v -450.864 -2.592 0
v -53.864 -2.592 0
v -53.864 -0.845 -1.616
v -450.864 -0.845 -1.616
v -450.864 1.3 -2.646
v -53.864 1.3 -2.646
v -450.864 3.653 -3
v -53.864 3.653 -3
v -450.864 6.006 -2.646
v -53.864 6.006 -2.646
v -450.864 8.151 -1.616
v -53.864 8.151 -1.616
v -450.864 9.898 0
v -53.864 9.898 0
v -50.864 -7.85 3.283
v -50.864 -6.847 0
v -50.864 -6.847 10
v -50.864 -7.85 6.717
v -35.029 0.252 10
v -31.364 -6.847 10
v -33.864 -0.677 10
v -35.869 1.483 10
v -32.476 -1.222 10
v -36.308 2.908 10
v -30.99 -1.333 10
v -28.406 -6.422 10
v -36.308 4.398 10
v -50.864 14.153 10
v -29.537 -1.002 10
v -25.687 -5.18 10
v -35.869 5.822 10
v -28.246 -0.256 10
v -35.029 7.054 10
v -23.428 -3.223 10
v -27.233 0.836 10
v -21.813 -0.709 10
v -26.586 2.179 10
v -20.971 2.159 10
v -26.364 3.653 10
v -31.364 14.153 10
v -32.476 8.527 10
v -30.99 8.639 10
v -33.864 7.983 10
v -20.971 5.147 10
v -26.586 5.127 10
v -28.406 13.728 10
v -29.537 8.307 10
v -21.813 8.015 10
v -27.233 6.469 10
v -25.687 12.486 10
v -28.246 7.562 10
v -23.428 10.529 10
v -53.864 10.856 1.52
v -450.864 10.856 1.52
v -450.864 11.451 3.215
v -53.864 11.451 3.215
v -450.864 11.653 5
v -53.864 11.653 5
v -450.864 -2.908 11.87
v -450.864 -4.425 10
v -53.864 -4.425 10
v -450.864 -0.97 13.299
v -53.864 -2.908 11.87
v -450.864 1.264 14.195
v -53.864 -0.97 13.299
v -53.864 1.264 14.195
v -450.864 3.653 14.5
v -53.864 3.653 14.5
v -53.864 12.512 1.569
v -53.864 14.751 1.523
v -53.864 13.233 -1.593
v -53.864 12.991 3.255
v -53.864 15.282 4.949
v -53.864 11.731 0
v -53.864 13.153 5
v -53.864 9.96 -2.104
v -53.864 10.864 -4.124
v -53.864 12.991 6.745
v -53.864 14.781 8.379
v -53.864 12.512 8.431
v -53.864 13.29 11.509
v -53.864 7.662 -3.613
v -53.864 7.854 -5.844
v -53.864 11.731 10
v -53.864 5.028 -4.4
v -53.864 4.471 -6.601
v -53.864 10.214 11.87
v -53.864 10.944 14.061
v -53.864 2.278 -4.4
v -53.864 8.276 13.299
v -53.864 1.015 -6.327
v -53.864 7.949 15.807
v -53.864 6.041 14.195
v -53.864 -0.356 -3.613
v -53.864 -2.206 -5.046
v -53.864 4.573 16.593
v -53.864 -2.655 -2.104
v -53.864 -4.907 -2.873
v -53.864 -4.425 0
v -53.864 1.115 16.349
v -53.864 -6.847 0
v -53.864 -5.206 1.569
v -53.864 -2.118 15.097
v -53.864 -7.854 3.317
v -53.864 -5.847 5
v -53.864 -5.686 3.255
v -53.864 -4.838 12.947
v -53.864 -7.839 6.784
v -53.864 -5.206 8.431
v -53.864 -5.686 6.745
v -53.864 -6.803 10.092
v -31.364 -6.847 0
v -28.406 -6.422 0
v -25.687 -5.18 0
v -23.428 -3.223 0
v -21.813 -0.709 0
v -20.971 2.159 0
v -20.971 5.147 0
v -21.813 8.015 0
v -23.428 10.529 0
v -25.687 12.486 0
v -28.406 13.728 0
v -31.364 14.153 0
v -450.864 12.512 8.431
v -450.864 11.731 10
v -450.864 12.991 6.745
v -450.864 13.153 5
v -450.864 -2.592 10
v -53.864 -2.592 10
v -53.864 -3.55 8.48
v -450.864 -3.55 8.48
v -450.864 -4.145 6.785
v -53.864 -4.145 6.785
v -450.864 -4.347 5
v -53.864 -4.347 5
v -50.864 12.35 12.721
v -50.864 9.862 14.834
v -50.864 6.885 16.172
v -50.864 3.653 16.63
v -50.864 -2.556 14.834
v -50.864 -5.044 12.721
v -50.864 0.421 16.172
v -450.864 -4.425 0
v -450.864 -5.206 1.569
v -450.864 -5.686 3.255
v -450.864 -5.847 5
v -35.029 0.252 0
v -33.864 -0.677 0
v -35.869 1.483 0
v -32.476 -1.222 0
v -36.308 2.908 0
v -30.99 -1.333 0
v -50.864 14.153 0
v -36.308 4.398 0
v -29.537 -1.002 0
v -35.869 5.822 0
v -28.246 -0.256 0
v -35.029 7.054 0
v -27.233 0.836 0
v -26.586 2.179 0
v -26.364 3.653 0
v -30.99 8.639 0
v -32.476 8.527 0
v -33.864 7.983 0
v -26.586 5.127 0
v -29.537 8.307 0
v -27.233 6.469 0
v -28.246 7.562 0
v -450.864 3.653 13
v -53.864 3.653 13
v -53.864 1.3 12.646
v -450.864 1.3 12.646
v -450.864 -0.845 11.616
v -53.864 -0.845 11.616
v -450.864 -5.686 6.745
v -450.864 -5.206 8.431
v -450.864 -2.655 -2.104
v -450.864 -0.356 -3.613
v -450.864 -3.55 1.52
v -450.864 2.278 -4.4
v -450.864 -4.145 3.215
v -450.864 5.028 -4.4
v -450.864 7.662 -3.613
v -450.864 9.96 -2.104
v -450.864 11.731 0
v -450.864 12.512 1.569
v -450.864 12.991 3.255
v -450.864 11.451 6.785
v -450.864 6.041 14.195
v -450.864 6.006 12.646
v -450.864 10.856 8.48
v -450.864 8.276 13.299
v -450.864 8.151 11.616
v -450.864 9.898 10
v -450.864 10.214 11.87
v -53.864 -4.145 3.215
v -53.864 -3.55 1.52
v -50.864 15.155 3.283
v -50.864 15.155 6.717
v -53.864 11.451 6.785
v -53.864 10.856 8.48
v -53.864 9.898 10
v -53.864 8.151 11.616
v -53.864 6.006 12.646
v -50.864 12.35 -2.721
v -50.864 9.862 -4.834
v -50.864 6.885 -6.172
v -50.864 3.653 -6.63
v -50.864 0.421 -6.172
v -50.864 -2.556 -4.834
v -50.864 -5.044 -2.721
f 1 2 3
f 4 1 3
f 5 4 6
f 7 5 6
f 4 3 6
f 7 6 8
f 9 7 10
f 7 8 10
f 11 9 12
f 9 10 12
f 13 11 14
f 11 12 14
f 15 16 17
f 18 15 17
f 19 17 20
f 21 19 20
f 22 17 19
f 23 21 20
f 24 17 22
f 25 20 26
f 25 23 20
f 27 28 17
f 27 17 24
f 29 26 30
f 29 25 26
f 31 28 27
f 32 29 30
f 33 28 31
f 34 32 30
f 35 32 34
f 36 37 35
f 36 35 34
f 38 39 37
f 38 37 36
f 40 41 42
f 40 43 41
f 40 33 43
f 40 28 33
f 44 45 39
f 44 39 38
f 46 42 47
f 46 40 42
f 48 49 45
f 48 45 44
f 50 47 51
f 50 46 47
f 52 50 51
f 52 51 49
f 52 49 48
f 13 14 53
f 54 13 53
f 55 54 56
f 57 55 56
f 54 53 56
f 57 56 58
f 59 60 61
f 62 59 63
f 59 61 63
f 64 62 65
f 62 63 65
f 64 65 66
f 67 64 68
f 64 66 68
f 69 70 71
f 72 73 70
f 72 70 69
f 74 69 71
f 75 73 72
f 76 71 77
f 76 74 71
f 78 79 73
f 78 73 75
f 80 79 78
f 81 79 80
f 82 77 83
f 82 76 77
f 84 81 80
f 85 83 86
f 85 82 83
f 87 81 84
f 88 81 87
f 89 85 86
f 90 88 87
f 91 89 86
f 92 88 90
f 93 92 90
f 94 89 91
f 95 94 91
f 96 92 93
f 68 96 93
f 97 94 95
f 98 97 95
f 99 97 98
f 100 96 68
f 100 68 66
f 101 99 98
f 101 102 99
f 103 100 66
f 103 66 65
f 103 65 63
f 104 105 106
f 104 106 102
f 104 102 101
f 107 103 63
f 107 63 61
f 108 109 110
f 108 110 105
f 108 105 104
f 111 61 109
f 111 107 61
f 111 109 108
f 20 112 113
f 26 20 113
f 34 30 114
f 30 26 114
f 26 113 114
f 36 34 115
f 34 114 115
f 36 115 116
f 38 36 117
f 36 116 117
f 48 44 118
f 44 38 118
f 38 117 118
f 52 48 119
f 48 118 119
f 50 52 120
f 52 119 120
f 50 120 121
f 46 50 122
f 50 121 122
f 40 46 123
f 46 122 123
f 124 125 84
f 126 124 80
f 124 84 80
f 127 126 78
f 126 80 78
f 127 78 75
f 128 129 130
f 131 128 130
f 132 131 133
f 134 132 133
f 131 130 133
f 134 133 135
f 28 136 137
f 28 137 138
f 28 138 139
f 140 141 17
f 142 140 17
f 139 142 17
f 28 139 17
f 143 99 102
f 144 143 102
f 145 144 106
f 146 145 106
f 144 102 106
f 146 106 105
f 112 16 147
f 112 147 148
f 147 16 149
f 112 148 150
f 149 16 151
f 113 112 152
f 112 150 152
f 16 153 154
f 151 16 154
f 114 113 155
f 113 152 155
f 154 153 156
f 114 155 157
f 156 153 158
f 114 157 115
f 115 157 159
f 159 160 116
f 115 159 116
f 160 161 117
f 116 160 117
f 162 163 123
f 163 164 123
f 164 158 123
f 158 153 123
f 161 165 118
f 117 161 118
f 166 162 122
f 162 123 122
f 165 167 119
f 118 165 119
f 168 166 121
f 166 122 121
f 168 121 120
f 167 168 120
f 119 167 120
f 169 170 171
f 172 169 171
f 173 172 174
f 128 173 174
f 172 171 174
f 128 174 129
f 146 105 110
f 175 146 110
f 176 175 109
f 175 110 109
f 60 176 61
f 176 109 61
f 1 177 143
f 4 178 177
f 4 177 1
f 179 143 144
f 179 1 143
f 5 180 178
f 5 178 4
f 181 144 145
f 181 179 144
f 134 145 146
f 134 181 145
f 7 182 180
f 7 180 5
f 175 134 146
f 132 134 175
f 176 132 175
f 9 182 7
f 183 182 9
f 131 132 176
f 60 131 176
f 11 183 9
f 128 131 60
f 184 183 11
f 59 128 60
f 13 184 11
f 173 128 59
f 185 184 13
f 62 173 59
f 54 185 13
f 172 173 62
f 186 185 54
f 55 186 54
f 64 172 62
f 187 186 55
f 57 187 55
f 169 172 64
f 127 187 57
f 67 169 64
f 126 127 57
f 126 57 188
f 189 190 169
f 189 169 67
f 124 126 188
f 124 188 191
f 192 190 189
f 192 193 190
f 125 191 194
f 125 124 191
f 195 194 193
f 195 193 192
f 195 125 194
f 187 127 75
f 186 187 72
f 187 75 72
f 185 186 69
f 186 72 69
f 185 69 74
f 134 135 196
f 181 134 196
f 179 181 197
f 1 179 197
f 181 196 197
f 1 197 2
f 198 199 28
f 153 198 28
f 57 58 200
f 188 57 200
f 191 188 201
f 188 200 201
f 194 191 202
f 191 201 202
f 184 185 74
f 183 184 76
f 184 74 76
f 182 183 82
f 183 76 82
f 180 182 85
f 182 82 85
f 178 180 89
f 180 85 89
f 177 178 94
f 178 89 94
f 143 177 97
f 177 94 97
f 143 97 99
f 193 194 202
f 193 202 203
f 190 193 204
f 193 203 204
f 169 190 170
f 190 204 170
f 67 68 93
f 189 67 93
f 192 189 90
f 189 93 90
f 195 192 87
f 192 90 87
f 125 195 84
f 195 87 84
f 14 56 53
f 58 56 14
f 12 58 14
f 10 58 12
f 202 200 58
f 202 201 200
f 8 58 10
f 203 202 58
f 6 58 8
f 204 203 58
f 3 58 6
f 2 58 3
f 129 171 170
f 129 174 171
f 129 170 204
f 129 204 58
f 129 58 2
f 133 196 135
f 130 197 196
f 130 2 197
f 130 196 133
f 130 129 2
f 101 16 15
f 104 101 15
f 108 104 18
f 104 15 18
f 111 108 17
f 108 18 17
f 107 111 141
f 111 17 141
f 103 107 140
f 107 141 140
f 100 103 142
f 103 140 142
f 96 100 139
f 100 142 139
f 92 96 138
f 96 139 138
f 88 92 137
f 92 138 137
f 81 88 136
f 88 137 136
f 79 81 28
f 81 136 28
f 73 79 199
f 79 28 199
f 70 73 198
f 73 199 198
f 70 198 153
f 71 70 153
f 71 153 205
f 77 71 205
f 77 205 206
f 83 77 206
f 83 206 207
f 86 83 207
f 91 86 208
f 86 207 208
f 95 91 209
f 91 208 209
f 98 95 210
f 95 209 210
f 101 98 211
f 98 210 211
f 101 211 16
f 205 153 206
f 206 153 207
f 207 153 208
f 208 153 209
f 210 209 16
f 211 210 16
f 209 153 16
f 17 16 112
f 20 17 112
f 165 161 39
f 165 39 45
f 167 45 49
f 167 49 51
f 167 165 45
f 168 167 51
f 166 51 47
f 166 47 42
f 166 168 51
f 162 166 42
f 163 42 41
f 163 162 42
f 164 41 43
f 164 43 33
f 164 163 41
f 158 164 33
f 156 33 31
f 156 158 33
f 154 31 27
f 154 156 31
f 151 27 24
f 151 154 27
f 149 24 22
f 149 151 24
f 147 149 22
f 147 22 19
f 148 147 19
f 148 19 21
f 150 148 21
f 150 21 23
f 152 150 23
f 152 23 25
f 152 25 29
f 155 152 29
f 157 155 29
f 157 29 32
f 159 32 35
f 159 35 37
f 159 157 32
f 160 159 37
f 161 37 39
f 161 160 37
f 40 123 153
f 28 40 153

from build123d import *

# Parameters (mm, degrees)
SKETCH1_R            = 5
BOSS_EXTRUDE1_DEPTH  = 10
SKETCH2_R            = 11.62970335
BOSS_EXTRUDE9_DEPTH  = 3
SKETCH2_8_R          = 9.5
SKETCH2_8_R_2        = 8
BOSS_EXTRUDE10_DEPTH = 400


with BuildPart() as part:
    # Sketch1 → Boss-Extrude1 (new body)
    with BuildSketch(Plane.XY):
        with BuildLine():
            Line((-31.363787375, 14.15282392), (-50.863787375, 14.15282392))
            Line((-50.863787375, 14.15282392), (-50.863787375, -6.84717608))
            Line((-50.863787375, -6.84717608), (-31.363787375, -6.84717608))
            ThreePointArc((-31.363787375, -6.84717608), (-20.863787375, 3.65282392), (-31.363787375, 14.15282392))
        make_face()
        with Locations((-31.363787375, 3.65282392)):
            Circle(SKETCH1_R, mode=Mode.SUBTRACT)
    extrude(amount=BOSS_EXTRUDE1_DEPTH)

    # Sketch2 → Boss-Extrude9 (add)
    with BuildSketch(Plane.ZY.offset(50.863787375)):
        with Locations((5, 3.65282392)):
            Circle(SKETCH2_R)
    extrude(amount=BOSS_EXTRUDE9_DEPTH)

    # Sketch2<8> → Boss-Extrude10 (add)
    with BuildSketch(Plane.ZY.offset(50.863787375)):
        with Locations((5, 3.65282392)):
            Circle(SKETCH2_8_R)
        with Locations((5, 3.65282392)):
            Circle(SKETCH2_8_R_2, mode=Mode.SUBTRACT)
    extrude(amount=BOSS_EXTRUDE10_DEPTH)


solid = part.part
